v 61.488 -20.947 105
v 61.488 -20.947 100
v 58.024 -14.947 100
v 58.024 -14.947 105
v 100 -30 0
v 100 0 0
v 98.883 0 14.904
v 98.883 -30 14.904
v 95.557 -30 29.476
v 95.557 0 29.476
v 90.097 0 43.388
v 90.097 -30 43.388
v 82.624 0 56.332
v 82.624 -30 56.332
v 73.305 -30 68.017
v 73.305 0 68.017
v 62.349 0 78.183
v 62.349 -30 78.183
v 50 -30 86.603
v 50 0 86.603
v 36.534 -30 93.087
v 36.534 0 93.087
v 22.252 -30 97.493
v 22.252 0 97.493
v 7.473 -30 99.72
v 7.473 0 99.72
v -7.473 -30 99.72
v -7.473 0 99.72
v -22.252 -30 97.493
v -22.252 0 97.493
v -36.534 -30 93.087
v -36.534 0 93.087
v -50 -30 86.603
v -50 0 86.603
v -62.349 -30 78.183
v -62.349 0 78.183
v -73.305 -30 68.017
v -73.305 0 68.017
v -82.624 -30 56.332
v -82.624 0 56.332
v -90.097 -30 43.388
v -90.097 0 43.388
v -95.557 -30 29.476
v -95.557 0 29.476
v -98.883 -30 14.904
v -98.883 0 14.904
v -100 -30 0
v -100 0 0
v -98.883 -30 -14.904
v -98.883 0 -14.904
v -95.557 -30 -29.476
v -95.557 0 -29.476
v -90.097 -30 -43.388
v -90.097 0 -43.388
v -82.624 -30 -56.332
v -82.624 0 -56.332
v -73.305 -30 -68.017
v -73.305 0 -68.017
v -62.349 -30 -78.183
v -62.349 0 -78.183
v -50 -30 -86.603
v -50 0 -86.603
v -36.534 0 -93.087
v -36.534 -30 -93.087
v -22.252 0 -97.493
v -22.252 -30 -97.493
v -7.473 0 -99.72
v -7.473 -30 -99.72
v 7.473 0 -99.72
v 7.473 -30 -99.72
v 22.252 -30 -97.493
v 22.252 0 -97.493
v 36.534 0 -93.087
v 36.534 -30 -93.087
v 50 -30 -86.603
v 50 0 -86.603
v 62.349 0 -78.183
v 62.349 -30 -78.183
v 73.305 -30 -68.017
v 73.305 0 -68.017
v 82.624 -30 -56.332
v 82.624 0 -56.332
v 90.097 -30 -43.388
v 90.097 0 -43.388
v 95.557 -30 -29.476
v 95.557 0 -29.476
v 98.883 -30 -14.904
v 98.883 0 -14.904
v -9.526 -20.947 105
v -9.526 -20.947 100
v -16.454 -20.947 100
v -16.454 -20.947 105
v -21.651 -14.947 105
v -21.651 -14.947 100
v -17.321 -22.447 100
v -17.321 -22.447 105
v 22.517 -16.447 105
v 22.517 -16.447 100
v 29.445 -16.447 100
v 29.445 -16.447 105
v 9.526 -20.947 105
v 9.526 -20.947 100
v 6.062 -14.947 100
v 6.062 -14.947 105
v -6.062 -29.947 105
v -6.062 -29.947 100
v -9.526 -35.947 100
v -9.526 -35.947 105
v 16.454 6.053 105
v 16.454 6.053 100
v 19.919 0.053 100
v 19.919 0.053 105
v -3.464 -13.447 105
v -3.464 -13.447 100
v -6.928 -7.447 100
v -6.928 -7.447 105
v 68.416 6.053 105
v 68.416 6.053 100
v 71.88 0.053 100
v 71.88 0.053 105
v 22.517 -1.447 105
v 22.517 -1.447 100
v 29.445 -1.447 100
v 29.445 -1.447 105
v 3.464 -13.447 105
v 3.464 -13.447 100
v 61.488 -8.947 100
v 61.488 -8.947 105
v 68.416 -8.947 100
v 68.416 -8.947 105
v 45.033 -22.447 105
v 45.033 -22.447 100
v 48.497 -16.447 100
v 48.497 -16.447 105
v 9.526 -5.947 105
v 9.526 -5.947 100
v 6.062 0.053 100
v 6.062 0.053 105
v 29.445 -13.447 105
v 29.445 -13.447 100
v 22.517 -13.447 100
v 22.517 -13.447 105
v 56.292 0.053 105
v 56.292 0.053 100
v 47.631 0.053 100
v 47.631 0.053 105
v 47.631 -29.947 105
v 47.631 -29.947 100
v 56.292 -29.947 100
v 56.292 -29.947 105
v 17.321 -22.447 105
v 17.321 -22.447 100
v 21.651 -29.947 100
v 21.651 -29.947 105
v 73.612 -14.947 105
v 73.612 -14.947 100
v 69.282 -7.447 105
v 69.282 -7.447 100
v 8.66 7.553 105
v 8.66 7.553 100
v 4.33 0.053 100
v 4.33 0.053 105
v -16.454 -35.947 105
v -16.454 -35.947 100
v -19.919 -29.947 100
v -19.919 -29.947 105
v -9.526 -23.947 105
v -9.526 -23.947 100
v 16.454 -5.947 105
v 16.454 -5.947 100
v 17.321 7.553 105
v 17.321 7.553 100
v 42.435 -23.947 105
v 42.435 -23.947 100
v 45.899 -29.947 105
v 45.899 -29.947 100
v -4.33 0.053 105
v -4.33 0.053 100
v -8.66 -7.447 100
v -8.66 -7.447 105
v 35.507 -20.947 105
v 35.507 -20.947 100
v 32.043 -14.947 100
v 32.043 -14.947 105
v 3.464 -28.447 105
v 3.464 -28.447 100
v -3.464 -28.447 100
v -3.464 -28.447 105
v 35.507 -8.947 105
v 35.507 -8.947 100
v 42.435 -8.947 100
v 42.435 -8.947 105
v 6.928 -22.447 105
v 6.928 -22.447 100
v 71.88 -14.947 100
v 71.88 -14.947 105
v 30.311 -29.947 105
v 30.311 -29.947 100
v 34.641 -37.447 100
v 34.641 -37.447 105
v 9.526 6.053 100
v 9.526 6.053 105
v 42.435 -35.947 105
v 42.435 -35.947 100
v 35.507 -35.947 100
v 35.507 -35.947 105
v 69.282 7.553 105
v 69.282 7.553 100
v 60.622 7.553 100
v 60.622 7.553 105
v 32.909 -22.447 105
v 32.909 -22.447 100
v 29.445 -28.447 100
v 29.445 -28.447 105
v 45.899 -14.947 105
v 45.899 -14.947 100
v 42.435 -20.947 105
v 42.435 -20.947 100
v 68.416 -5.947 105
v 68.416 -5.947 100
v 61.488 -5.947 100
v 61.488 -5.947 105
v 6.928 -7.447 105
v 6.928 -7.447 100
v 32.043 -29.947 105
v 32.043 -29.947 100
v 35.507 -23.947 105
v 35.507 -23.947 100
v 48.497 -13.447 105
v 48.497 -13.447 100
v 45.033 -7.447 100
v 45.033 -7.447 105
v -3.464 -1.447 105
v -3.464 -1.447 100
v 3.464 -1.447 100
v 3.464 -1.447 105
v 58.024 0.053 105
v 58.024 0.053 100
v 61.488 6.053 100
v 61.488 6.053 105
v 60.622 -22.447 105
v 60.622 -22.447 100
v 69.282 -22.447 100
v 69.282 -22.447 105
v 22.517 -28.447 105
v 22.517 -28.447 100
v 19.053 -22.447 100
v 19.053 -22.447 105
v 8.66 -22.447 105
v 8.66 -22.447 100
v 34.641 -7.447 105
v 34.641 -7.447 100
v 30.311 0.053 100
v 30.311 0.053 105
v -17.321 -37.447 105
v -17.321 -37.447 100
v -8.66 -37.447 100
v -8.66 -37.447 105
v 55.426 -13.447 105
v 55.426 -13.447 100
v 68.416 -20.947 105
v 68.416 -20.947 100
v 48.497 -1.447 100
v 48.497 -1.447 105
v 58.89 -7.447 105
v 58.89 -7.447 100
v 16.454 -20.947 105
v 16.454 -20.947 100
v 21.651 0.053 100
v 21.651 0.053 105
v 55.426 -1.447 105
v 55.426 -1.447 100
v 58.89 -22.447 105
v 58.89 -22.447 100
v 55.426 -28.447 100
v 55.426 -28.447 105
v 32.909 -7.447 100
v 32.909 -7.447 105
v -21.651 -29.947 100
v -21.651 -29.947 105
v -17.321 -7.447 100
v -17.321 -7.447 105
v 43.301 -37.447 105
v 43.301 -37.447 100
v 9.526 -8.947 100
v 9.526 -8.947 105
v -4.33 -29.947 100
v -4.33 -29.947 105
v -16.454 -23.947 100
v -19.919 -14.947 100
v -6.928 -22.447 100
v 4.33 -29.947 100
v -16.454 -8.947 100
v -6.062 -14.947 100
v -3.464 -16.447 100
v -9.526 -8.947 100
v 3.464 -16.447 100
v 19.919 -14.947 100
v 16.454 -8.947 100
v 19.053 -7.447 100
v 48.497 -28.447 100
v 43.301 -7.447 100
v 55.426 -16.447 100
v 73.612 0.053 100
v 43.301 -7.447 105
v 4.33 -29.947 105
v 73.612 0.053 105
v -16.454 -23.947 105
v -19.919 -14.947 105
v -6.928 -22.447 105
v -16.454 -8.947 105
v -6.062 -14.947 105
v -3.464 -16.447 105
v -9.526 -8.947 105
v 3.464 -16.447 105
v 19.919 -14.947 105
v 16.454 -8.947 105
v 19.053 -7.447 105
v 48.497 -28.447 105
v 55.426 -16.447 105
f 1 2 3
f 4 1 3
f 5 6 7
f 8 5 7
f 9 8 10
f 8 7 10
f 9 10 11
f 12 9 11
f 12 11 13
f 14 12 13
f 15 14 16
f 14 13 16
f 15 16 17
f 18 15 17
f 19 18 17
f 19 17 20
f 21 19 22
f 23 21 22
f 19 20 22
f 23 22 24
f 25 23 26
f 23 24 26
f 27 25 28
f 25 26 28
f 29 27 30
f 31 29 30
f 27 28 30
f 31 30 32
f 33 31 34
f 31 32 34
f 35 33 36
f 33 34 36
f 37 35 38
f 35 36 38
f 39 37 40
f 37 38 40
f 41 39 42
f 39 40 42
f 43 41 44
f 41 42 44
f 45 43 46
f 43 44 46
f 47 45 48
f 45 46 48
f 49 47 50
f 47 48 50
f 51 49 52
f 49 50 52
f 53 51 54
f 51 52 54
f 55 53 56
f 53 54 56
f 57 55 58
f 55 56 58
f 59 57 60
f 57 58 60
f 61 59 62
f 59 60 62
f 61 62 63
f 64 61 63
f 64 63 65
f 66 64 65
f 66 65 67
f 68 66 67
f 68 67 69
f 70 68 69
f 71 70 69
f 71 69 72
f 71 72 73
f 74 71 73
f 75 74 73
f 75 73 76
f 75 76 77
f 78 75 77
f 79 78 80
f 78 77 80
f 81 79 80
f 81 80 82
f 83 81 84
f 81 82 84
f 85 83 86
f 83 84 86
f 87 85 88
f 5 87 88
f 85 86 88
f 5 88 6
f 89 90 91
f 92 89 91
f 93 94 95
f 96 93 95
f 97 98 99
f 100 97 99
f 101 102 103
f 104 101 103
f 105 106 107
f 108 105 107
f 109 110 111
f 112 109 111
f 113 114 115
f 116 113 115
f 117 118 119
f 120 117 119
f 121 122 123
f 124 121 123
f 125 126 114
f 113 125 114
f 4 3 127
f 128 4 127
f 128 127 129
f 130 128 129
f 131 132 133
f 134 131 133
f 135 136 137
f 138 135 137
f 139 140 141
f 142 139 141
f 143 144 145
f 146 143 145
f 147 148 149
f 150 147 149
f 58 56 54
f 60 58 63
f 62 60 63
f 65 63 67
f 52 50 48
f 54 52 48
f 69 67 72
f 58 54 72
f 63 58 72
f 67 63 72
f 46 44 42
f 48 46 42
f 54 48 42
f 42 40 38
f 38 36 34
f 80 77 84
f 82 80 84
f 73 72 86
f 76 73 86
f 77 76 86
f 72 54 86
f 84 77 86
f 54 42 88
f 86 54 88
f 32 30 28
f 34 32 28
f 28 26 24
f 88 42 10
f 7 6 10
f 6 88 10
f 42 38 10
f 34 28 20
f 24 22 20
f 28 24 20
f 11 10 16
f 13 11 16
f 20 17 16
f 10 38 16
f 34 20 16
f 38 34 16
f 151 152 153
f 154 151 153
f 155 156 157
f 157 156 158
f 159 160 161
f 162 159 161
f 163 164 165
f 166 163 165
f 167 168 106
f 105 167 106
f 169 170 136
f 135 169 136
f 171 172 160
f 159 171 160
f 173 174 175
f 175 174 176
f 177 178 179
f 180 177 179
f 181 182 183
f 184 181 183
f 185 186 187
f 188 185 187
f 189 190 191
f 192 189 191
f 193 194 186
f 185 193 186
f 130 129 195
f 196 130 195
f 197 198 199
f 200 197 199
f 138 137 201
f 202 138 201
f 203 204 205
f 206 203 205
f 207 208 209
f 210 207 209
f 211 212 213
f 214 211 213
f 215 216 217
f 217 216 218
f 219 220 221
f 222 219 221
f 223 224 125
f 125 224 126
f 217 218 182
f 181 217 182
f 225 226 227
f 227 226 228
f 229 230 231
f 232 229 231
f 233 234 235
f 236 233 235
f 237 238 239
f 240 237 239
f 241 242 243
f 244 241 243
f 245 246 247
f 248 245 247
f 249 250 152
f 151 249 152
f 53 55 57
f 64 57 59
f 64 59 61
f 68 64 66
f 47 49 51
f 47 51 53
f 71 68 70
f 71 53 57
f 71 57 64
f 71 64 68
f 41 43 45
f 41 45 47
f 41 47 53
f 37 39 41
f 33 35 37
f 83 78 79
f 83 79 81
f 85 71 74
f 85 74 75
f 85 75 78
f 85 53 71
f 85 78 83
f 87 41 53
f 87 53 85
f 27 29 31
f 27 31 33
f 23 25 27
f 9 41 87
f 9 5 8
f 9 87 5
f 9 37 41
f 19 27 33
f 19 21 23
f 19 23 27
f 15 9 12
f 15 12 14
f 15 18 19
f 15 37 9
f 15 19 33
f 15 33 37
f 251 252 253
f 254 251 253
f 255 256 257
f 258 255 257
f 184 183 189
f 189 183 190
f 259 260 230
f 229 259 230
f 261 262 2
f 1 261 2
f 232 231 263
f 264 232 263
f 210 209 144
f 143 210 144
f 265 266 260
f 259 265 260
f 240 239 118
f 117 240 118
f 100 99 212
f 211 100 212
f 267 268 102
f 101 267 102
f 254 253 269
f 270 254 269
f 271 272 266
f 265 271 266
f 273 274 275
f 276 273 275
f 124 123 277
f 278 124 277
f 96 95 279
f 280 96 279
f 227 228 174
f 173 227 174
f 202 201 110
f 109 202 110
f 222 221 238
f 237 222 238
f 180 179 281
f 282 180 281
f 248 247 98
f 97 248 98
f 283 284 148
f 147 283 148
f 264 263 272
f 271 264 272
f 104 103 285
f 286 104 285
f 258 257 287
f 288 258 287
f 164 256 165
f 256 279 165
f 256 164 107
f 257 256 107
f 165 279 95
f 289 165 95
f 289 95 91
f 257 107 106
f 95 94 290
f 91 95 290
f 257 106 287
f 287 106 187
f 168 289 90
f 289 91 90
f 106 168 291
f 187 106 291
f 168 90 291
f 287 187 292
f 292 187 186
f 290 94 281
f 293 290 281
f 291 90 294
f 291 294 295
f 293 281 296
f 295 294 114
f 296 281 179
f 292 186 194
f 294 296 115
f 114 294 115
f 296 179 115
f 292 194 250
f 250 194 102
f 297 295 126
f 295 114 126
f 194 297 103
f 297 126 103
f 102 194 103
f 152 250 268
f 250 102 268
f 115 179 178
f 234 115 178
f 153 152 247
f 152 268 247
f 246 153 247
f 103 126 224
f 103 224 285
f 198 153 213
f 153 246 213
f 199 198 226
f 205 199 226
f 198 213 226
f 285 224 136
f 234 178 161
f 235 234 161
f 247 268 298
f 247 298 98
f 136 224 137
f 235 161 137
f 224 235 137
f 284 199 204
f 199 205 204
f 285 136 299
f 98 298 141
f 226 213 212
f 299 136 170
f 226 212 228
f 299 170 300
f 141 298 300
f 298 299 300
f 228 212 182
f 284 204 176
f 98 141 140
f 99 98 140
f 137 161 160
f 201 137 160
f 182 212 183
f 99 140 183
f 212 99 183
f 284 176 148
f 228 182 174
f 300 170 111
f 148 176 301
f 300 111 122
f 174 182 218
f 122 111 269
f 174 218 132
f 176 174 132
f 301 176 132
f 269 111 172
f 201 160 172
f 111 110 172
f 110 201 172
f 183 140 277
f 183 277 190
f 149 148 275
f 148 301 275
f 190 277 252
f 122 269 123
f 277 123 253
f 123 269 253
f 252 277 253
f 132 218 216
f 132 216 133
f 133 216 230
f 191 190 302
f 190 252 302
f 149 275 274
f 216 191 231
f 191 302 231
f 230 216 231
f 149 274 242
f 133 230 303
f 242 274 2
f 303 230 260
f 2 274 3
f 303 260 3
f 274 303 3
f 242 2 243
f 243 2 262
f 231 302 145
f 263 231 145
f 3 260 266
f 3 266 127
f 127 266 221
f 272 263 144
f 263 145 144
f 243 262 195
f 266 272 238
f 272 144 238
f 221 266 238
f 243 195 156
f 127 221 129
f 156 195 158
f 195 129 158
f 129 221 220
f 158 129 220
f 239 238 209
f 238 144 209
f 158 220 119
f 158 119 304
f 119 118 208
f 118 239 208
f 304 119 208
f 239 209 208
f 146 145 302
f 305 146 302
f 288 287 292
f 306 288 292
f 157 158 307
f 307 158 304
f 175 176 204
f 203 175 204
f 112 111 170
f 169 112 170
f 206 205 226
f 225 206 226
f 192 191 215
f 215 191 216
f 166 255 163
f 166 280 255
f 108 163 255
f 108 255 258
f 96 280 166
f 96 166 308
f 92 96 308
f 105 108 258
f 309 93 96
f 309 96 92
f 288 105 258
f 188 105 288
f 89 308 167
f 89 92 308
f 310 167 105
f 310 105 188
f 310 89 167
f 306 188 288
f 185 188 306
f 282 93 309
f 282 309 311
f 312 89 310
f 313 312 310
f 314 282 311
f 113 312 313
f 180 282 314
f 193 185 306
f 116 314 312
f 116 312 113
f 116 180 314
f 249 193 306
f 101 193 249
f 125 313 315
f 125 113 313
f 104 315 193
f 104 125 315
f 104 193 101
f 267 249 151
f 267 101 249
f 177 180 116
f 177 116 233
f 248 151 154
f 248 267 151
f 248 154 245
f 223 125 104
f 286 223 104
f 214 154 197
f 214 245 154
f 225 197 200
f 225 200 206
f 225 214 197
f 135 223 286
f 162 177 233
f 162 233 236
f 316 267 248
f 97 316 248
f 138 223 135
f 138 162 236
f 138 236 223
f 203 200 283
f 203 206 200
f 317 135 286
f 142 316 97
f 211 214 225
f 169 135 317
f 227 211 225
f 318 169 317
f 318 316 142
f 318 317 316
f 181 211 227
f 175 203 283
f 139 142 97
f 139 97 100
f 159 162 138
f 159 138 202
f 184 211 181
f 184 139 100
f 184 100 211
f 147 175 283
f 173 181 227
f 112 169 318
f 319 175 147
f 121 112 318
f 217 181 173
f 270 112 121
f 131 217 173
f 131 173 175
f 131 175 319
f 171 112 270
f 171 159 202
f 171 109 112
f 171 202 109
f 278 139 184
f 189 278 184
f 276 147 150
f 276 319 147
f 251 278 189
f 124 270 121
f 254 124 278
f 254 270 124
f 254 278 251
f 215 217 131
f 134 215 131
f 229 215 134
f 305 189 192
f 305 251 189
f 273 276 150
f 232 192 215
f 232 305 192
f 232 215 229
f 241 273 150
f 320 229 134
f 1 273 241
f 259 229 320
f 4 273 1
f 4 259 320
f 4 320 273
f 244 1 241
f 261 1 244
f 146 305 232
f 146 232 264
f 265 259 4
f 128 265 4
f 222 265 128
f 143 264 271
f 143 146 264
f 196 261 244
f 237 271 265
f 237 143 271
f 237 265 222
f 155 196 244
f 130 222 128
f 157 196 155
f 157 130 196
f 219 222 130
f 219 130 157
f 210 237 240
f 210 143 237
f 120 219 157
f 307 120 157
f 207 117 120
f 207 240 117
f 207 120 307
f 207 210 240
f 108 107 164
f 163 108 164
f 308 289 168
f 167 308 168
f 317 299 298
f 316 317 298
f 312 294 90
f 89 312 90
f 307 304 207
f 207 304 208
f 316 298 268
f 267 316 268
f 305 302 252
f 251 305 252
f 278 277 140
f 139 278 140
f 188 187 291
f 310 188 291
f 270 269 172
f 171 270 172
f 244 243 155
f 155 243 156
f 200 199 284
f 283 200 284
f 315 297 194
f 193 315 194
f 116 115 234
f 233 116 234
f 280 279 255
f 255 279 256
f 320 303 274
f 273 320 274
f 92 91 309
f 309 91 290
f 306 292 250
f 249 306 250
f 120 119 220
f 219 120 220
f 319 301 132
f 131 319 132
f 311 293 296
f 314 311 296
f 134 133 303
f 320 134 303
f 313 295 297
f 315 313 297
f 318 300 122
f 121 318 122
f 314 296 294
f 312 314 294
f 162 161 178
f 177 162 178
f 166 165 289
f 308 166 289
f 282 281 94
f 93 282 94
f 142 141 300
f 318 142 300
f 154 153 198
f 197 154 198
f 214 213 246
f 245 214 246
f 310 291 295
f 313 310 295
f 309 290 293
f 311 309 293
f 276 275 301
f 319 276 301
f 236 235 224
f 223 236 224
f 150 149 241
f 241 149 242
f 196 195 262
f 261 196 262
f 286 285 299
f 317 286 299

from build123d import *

# Parameters (mm, degrees)
F0_R     = 100
F1_DEPTH = 30
F4_DEPTH = 5


with BuildPart() as f1:
    # F0 (on Front) → F1 (new body)
    with BuildSketch(Plane.XZ):
        Circle(F0_R)
    extrude(amount=F1_DEPTH)


with BuildPart() as f4:
    # F3 (on offset) → F4 (new body)
    with BuildSketch(Plane.XY.offset(100)):
        Polygon((8.6602540378, -22.447098383), (4.3301270189, -14.947098383), (-4.3301270189, -14.947098383), (-8.6602540378, -22.447098383), (-4.3301270189, -29.947098383), (4.3301270189, -29.947098383), align=None)
        Polygon((6.9282032303, -22.447098383), (3.4641016151, -28.447098383), (-3.4641016151, -28.447098383), (-6.9282032303, -22.447098383), (-3.4641016151, -16.447098383), (3.4641016151, -16.447098383), align=None, mode=Mode.SUBTRACT)
        Polygon((-4.3301270189, -14.947098383), (4.3301270189, -14.947098383), (8.6602540378, -7.447098383), (4.3301270189, 0.052901617), (-4.3301270189, 0.052901617), (-8.6602540378, -7.447098383), align=None)
        Polygon((6.9282032303, -7.447098383), (3.4641016151, -13.447098383), (-3.4641016151, -13.447098383), (-6.9282032303, -7.447098383), (-3.4641016151, -1.447098383), (3.4641016151, -1.447098383), align=None, mode=Mode.SUBTRACT)
        Polygon((8.6602540378, -7.447098383), (4.3301270189, -14.947098383), (8.6602540378, -22.447098383), (17.3205080757, -22.447098383), (21.6506350946, -14.947098383), (17.3205080757, -7.447098383), align=None)
        Polygon((19.918584287, -14.947098383), (16.4544826719, -20.947098383), (9.5262794416, -20.947098383), (6.0621778265, -14.947098383), (9.5262794416, -8.947098383), (16.4544826719, -8.947098383), align=None, mode=Mode.SUBTRACT)
        Polygon((-8.6602540378, -22.447098383), (-4.3301270189, -14.947098383), (-8.6602540378, -7.447098383), (-17.3205080757, -7.447098383), (-21.6506350946, -14.947098383), (-17.3205080757, -22.447098383), align=None)
        Polygon((-6.0621778265, -14.947098383), (-9.5262794416, -20.947098383), (-16.4544826719, -20.947098383), (-19.918584287, -14.947098383), (-16.4544826719, -8.947098383), (-9.5262794416, -8.947098383), align=None, mode=Mode.SUBTRACT)
        Polygon((4.3301270189, 0.052901617), (8.6602540378, -7.447098383), (17.3205080757, -7.447098383), (21.6506350946, 0.052901617), (17.3205080757, 7.552901617), (8.6602540378, 7.552901617), align=None)
        Polygon((19.918584287, 0.052901617), (16.4544826719, -5.947098383), (9.5262794416, -5.947098383), (6.0621778265, 0.052901617), (9.5262794416, 6.052901617), (16.4544826719, 6.052901617), align=None, mode=Mode.SUBTRACT)
        Polygon((-4.3301270189, -29.947098383), (-8.6602540378, -22.447098383), (-17.3205080757, -22.447098383), (-21.6506350946, -29.947098383), (-17.3205080757, -37.447098383), (-8.6602540378, -37.447098383), align=None)
        Polygon((-6.0621778265, -29.947098383), (-9.5262794416, -35.947098383), (-16.4544826719, -35.947098383), (-19.918584287, -29.947098383), (-16.4544826719, -23.947098383), (-9.5262794416, -23.947098383), align=None, mode=Mode.SUBTRACT)
        Polygon((21.6506350946, 0.052901617), (17.3205080757, -7.447098383), (21.6506350946, -14.947098383), (30.3108891325, -14.947098383), (34.6410161514, -7.447098383), (30.3108891325, 0.052901617), align=None)
        Polygon((32.9089653438, -7.447098383), (29.4448637287, -13.447098383), (22.5166604984, -13.447098383), (19.0525588833, -7.447098383), (22.5166604984, -1.447098383), (29.4448637287, -1.447098383), align=None, mode=Mode.SUBTRACT)
        Polygon((21.6506350946, -14.947098383), (17.3205080757, -22.447098383), (21.6506350946, -29.947098383), (30.3108891325, -29.947098383), (34.6410161514, -22.447098383), (30.3108891325, -14.947098383), align=None)
        Polygon((32.9089653438, -22.447098383), (29.4448637287, -28.447098383), (22.5166604984, -28.447098383), (19.0525588833, -22.447098383), (22.5166604984, -16.447098383), (29.4448637287, -16.447098383), align=None, mode=Mode.SUBTRACT)
        Polygon((34.6410161514, -7.447098383), (30.3108891325, -14.947098383), (34.6410161514, -22.447098383), (43.3012701892, -22.447098383), (47.6313972081, -14.947098383), (43.3012701892, -7.447098383), align=None)
        Polygon((45.8993464006, -14.947098383), (42.4352447854, -20.947098383), (35.5070415552, -20.947098383), (32.04293994, -14.947098383), (35.5070415552, -8.947098383), (42.4352447854, -8.947098383), align=None, mode=Mode.SUBTRACT)
        Polygon((34.6410161514, -22.447098383), (30.3108891325, -29.947098383), (34.6410161514, -37.447098383), (43.3012701892, -37.447098383), (47.6313972081, -29.947098383), (43.3012701892, -22.447098383), align=None)
        Polygon((45.8993464006, -29.947098383), (42.4352447854, -35.947098383), (35.5070415552, -35.947098383), (32.04293994, -29.947098383), (35.5070415552, -23.947098383), (42.4352447854, -23.947098383), align=None, mode=Mode.SUBTRACT)
        Polygon((47.6313972081, 0.052901617), (43.3012701892, -7.447098383), (47.6313972081, -14.947098383), (56.291651246, -14.947098383), (60.6217782649, -7.447098383), (56.291651246, 0.052901617), align=None)
        Polygon((58.8897274573, -7.447098383), (55.4256258422, -13.447098383), (48.4974226119, -13.447098383), (45.0333209968, -7.447098383), (48.4974226119, -1.447098383), (55.4256258422, -1.447098383), align=None, mode=Mode.SUBTRACT)
        Polygon((47.6313972081, -14.947098383), (43.3012701892, -22.447098383), (47.6313972081, -29.947098383), (56.291651246, -29.947098383), (60.6217782649, -22.447098383), (56.291651246, -14.947098383), align=None)
        Polygon((58.8897274573, -22.447098383), (55.4256258422, -28.447098383), (48.4974226119, -28.447098383), (45.0333209968, -22.447098383), (48.4974226119, -16.447098383), (55.4256258422, -16.447098383), align=None, mode=Mode.SUBTRACT)
        Polygon((60.6217782649, -7.447098383), (56.291651246, -14.947098383), (60.6217782649, -22.447098383), (69.2820323028, -22.447098383), (73.6121593217, -14.947098383), (69.2820323028, -7.447098383), align=None)
        Polygon((71.8801085141, -14.947098383), (68.416006899, -20.947098383), (61.4878036687, -20.947098383), (58.0237020536, -14.947098383), (61.4878036687, -8.947098383), (68.416006899, -8.947098383), align=None, mode=Mode.SUBTRACT)
        Polygon((60.6217782649, 7.552901617), (56.291651246, 0.052901617), (60.6217782649, -7.447098383), (69.2820323028, -7.447098383), (73.6121593217, 0.052901617), (69.2820323028, 7.552901617), align=None)
        Polygon((71.8801085141, 0.052901617), (68.416006899, -5.947098383), (61.4878036687, -5.947098383), (58.0237020536, 0.052901617), (61.4878036687, 6.052901617), (68.416006899, 6.052901617), align=None, mode=Mode.SUBTRACT)
    extrude(amount=F4_DEPTH)


solid = Compound([f1.part, f4.part])
